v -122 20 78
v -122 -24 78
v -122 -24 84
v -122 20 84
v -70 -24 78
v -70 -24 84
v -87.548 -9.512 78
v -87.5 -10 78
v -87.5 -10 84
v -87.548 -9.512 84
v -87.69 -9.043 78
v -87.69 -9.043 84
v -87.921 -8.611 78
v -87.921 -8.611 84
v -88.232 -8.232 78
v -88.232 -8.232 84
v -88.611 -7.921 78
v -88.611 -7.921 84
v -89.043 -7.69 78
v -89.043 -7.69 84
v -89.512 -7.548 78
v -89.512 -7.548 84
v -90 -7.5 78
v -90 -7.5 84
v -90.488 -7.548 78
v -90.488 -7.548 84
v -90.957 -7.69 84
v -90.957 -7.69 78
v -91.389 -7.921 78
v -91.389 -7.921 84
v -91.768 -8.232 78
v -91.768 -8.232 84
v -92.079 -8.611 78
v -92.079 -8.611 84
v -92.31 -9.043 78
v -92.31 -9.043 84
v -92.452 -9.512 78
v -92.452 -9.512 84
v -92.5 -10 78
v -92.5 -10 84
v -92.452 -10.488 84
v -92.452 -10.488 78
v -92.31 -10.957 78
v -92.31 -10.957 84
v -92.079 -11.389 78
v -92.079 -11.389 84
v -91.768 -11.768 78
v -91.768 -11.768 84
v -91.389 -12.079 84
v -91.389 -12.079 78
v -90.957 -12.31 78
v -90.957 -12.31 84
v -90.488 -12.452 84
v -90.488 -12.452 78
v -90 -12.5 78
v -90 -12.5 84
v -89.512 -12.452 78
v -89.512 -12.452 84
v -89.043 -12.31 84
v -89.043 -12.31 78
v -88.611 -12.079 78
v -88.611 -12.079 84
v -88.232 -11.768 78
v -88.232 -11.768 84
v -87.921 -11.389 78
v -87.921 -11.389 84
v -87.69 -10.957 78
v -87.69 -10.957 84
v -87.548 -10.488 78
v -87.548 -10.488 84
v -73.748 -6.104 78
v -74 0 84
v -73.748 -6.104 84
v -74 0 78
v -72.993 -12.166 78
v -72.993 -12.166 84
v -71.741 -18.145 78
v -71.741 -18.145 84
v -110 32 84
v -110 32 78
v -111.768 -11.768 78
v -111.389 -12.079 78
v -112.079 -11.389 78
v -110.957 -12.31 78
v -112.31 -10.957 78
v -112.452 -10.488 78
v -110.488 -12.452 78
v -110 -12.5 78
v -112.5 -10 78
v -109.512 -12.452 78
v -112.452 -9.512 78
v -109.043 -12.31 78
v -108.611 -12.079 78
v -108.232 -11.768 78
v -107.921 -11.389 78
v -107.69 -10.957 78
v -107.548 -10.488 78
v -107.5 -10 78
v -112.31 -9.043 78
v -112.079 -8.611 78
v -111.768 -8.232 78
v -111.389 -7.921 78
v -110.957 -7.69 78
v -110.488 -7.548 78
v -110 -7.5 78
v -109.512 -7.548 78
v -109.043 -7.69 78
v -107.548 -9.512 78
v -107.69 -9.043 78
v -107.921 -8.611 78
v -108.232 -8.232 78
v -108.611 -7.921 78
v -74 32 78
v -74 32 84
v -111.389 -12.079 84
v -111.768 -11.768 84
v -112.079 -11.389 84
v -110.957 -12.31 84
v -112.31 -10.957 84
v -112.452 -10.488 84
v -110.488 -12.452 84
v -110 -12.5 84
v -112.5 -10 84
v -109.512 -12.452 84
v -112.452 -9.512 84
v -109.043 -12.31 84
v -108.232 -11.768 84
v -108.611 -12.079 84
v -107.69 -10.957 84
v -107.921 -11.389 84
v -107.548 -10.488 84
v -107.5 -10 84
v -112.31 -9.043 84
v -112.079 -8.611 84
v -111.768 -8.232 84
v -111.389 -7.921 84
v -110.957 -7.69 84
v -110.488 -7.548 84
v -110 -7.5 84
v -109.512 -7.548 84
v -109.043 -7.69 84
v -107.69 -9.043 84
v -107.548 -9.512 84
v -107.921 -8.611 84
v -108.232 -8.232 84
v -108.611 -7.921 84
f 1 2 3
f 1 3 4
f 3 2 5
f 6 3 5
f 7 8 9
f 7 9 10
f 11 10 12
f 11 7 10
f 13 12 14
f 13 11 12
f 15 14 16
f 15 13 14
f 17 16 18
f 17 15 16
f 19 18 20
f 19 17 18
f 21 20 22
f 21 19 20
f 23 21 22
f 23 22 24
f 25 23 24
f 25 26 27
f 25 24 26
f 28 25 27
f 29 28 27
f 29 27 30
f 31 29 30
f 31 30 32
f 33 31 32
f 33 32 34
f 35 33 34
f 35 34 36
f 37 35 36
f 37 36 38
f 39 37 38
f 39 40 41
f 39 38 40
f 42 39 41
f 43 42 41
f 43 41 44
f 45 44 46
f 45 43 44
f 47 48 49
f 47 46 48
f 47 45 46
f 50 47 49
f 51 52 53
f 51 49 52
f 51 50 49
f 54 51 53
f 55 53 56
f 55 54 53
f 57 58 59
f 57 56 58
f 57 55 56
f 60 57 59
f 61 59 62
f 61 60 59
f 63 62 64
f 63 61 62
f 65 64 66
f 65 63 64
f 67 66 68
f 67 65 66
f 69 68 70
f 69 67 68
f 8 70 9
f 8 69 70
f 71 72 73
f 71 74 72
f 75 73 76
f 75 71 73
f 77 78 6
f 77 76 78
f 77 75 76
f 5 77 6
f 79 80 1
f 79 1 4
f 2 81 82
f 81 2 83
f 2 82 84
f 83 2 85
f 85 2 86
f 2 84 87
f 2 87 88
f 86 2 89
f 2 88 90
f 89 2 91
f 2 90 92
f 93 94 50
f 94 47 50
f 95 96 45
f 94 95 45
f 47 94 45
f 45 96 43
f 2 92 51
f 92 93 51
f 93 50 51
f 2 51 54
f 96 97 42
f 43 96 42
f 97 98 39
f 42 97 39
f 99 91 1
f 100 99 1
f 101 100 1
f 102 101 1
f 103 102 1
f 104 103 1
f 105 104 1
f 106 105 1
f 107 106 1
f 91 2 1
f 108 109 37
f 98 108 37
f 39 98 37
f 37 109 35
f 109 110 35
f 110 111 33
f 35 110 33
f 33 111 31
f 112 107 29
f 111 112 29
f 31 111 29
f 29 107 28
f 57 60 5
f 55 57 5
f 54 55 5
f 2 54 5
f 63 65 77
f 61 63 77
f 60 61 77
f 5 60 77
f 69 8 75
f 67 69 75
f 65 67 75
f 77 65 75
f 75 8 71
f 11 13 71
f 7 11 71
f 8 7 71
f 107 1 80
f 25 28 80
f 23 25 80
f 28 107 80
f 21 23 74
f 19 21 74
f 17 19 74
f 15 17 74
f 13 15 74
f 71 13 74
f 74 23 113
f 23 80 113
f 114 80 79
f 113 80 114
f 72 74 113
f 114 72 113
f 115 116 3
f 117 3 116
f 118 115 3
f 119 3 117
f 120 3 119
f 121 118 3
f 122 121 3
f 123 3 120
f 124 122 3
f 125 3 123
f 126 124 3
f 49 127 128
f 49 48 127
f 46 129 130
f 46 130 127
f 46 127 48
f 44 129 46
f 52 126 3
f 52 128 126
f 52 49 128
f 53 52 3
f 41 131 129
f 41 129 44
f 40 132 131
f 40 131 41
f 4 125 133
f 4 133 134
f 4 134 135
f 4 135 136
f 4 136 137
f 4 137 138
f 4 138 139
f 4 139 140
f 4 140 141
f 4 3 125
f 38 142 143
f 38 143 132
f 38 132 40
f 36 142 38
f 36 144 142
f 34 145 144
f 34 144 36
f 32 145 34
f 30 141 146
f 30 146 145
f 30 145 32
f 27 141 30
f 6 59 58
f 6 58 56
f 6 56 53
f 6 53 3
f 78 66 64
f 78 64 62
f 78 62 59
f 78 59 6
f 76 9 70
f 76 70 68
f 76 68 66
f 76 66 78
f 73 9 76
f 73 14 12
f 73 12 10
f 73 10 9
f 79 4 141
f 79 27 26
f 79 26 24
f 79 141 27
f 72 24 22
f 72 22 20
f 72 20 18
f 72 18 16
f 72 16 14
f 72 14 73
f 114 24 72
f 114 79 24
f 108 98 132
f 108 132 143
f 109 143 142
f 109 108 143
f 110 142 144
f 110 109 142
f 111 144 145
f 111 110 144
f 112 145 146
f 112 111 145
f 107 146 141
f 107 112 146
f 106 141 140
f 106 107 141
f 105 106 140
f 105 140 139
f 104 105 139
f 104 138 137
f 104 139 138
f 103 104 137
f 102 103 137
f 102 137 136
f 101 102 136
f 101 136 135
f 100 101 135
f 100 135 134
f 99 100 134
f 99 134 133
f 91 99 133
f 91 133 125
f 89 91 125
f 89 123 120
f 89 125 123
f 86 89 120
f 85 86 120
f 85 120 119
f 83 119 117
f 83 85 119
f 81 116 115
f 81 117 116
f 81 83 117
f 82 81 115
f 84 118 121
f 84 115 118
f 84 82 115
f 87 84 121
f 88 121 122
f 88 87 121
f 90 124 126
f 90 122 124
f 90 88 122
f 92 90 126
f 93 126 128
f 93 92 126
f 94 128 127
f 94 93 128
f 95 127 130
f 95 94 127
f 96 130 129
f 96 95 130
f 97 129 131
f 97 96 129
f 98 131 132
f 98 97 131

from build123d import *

# Parameters (mm, degrees)
BOX749_W           = 148
BOX749_H           = 74
BOX749_DEPTH       = 55
CYLINDER1788_R     = 2.5
CYLINDER1788_DEPTH = 20
CYLINDER1789_R     = 2.5
CYLINDER1789_DEPTH = 20
CYLINDER1787_R     = 74
CYLINDER1787_DEPTH = 32
BOX748_W           = 62
BOX748_H           = 56
BOX748_DEPTH       = 6
CHAMFER062_SIZE    = 12


with BuildPart() as krychle749:
    # Box749 → Box749 (new body)
    with BuildSketch(Plane(origin=(-74, 0, 29), x_dir=(1, 0, 0), z_dir=(0, 0, 1))):
        with Locations((74, 37)):
            Rectangle(BOX749_W, BOX749_H)
    extrude(amount=BOX749_DEPTH)


with BuildPart() as v_lec1788:
    # Cylinder1788 → Cylinder1788 (new body)
    with BuildSketch(Plane(origin=(-90, -10, 66), x_dir=(1, 0, 0), z_dir=(0, 0, 1))):
        Circle(CYLINDER1788_R)
    extrude(amount=CYLINDER1788_DEPTH)


with BuildPart() as compound914:
    # Cylinder1789 → Cylinder1789 (new body)
    with BuildSketch(Plane(origin=(-110, -10, 66), x_dir=(1, 0, 0), z_dir=(0, 0, 1))):
        Circle(CYLINDER1789_R)
    extrude(amount=CYLINDER1789_DEPTH)

    # Compound914: union Válec1788
    add(v_lec1788.part)


with BuildPart() as v_lec1787:
    # Cylinder1787 → Cylinder1787 (new body)
    with BuildSketch(Plane.XY.offset(66)):
        Circle(CYLINDER1787_R)
    extrude(amount=CYLINDER1787_DEPTH)


with BuildPart() as cut552:
    # Box748 → Box748 (new body)
    with BuildSketch(Plane(origin=(-122, -24, 76), x_dir=(1, 0, 0), z_dir=(0, 0, 1))):
        with Locations((31, 28)):
            Rectangle(BOX748_W, BOX748_H)
    extrude(amount=BOX748_DEPTH)

    # Cut545: cut Válec1787
    add(v_lec1787.part, mode=Mode.SUBTRACT)

    # Cut544: cut Compound914
    add(compound914.part, mode=Mode.SUBTRACT)


with BuildPart() as cut552_1:
    # Cut544 placement: moved
    add(cut552.part.moved(Location((0, 0, 2))))

    # Chamfer062
    chamfer062_edges = [cut552_1.edges().sort_by_distance(p)[0] for p in [
        (-122, 32, 81),
    ]]
    chamfer(chamfer062_edges, length=CHAMFER062_SIZE)

    # Cut552: cut Krychle749
    add(krychle749.part, mode=Mode.SUBTRACT)


solid = cut552_1.part
